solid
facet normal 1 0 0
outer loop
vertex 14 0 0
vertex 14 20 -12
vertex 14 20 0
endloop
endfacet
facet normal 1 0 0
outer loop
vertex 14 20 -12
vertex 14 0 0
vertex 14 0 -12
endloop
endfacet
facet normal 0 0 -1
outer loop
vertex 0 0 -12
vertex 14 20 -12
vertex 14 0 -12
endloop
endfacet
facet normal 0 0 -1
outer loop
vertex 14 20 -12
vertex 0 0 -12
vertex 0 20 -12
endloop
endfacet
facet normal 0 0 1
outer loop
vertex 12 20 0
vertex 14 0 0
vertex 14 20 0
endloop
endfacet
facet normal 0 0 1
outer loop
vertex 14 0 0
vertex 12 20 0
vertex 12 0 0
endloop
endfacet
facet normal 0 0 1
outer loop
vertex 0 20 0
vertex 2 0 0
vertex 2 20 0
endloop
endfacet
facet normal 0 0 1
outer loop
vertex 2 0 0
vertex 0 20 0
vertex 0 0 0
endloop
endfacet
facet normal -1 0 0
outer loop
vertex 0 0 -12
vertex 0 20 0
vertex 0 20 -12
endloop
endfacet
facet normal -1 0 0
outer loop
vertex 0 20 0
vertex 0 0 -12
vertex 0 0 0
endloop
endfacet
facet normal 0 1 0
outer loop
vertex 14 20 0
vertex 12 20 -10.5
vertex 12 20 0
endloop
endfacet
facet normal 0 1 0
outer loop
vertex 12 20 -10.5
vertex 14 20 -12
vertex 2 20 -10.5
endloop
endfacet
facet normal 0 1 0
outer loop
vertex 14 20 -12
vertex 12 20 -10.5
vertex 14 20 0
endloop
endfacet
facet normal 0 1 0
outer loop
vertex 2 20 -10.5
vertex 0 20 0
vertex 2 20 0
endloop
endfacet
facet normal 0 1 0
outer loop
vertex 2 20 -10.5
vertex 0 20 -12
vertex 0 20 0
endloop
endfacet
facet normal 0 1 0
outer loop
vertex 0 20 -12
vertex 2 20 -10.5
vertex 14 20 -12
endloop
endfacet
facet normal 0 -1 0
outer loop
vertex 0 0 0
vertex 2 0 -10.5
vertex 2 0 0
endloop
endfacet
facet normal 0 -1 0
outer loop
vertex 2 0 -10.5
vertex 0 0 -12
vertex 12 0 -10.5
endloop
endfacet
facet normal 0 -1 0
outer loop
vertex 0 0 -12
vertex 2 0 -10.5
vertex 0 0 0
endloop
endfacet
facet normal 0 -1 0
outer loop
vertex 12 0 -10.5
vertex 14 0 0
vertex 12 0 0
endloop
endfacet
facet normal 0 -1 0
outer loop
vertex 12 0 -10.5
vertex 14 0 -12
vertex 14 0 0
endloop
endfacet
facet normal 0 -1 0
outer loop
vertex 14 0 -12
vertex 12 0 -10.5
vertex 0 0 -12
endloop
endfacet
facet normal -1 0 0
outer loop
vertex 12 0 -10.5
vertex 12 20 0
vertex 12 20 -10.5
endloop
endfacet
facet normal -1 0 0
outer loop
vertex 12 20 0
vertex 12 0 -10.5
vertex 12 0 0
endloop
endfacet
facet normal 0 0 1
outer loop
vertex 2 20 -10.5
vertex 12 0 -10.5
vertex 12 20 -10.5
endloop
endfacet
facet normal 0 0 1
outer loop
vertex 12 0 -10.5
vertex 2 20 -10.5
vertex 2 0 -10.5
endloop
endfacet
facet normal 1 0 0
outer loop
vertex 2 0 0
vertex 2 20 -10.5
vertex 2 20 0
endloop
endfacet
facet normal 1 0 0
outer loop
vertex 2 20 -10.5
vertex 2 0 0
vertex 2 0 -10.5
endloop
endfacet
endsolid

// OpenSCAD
mirror ([0, 0, 1]) {
  difference () {
    cube ([14, 20, 12]);
    translate ([2, -0.5, -0.5]) {
      cube ([10, 21, 11]);
    }
  }
}
